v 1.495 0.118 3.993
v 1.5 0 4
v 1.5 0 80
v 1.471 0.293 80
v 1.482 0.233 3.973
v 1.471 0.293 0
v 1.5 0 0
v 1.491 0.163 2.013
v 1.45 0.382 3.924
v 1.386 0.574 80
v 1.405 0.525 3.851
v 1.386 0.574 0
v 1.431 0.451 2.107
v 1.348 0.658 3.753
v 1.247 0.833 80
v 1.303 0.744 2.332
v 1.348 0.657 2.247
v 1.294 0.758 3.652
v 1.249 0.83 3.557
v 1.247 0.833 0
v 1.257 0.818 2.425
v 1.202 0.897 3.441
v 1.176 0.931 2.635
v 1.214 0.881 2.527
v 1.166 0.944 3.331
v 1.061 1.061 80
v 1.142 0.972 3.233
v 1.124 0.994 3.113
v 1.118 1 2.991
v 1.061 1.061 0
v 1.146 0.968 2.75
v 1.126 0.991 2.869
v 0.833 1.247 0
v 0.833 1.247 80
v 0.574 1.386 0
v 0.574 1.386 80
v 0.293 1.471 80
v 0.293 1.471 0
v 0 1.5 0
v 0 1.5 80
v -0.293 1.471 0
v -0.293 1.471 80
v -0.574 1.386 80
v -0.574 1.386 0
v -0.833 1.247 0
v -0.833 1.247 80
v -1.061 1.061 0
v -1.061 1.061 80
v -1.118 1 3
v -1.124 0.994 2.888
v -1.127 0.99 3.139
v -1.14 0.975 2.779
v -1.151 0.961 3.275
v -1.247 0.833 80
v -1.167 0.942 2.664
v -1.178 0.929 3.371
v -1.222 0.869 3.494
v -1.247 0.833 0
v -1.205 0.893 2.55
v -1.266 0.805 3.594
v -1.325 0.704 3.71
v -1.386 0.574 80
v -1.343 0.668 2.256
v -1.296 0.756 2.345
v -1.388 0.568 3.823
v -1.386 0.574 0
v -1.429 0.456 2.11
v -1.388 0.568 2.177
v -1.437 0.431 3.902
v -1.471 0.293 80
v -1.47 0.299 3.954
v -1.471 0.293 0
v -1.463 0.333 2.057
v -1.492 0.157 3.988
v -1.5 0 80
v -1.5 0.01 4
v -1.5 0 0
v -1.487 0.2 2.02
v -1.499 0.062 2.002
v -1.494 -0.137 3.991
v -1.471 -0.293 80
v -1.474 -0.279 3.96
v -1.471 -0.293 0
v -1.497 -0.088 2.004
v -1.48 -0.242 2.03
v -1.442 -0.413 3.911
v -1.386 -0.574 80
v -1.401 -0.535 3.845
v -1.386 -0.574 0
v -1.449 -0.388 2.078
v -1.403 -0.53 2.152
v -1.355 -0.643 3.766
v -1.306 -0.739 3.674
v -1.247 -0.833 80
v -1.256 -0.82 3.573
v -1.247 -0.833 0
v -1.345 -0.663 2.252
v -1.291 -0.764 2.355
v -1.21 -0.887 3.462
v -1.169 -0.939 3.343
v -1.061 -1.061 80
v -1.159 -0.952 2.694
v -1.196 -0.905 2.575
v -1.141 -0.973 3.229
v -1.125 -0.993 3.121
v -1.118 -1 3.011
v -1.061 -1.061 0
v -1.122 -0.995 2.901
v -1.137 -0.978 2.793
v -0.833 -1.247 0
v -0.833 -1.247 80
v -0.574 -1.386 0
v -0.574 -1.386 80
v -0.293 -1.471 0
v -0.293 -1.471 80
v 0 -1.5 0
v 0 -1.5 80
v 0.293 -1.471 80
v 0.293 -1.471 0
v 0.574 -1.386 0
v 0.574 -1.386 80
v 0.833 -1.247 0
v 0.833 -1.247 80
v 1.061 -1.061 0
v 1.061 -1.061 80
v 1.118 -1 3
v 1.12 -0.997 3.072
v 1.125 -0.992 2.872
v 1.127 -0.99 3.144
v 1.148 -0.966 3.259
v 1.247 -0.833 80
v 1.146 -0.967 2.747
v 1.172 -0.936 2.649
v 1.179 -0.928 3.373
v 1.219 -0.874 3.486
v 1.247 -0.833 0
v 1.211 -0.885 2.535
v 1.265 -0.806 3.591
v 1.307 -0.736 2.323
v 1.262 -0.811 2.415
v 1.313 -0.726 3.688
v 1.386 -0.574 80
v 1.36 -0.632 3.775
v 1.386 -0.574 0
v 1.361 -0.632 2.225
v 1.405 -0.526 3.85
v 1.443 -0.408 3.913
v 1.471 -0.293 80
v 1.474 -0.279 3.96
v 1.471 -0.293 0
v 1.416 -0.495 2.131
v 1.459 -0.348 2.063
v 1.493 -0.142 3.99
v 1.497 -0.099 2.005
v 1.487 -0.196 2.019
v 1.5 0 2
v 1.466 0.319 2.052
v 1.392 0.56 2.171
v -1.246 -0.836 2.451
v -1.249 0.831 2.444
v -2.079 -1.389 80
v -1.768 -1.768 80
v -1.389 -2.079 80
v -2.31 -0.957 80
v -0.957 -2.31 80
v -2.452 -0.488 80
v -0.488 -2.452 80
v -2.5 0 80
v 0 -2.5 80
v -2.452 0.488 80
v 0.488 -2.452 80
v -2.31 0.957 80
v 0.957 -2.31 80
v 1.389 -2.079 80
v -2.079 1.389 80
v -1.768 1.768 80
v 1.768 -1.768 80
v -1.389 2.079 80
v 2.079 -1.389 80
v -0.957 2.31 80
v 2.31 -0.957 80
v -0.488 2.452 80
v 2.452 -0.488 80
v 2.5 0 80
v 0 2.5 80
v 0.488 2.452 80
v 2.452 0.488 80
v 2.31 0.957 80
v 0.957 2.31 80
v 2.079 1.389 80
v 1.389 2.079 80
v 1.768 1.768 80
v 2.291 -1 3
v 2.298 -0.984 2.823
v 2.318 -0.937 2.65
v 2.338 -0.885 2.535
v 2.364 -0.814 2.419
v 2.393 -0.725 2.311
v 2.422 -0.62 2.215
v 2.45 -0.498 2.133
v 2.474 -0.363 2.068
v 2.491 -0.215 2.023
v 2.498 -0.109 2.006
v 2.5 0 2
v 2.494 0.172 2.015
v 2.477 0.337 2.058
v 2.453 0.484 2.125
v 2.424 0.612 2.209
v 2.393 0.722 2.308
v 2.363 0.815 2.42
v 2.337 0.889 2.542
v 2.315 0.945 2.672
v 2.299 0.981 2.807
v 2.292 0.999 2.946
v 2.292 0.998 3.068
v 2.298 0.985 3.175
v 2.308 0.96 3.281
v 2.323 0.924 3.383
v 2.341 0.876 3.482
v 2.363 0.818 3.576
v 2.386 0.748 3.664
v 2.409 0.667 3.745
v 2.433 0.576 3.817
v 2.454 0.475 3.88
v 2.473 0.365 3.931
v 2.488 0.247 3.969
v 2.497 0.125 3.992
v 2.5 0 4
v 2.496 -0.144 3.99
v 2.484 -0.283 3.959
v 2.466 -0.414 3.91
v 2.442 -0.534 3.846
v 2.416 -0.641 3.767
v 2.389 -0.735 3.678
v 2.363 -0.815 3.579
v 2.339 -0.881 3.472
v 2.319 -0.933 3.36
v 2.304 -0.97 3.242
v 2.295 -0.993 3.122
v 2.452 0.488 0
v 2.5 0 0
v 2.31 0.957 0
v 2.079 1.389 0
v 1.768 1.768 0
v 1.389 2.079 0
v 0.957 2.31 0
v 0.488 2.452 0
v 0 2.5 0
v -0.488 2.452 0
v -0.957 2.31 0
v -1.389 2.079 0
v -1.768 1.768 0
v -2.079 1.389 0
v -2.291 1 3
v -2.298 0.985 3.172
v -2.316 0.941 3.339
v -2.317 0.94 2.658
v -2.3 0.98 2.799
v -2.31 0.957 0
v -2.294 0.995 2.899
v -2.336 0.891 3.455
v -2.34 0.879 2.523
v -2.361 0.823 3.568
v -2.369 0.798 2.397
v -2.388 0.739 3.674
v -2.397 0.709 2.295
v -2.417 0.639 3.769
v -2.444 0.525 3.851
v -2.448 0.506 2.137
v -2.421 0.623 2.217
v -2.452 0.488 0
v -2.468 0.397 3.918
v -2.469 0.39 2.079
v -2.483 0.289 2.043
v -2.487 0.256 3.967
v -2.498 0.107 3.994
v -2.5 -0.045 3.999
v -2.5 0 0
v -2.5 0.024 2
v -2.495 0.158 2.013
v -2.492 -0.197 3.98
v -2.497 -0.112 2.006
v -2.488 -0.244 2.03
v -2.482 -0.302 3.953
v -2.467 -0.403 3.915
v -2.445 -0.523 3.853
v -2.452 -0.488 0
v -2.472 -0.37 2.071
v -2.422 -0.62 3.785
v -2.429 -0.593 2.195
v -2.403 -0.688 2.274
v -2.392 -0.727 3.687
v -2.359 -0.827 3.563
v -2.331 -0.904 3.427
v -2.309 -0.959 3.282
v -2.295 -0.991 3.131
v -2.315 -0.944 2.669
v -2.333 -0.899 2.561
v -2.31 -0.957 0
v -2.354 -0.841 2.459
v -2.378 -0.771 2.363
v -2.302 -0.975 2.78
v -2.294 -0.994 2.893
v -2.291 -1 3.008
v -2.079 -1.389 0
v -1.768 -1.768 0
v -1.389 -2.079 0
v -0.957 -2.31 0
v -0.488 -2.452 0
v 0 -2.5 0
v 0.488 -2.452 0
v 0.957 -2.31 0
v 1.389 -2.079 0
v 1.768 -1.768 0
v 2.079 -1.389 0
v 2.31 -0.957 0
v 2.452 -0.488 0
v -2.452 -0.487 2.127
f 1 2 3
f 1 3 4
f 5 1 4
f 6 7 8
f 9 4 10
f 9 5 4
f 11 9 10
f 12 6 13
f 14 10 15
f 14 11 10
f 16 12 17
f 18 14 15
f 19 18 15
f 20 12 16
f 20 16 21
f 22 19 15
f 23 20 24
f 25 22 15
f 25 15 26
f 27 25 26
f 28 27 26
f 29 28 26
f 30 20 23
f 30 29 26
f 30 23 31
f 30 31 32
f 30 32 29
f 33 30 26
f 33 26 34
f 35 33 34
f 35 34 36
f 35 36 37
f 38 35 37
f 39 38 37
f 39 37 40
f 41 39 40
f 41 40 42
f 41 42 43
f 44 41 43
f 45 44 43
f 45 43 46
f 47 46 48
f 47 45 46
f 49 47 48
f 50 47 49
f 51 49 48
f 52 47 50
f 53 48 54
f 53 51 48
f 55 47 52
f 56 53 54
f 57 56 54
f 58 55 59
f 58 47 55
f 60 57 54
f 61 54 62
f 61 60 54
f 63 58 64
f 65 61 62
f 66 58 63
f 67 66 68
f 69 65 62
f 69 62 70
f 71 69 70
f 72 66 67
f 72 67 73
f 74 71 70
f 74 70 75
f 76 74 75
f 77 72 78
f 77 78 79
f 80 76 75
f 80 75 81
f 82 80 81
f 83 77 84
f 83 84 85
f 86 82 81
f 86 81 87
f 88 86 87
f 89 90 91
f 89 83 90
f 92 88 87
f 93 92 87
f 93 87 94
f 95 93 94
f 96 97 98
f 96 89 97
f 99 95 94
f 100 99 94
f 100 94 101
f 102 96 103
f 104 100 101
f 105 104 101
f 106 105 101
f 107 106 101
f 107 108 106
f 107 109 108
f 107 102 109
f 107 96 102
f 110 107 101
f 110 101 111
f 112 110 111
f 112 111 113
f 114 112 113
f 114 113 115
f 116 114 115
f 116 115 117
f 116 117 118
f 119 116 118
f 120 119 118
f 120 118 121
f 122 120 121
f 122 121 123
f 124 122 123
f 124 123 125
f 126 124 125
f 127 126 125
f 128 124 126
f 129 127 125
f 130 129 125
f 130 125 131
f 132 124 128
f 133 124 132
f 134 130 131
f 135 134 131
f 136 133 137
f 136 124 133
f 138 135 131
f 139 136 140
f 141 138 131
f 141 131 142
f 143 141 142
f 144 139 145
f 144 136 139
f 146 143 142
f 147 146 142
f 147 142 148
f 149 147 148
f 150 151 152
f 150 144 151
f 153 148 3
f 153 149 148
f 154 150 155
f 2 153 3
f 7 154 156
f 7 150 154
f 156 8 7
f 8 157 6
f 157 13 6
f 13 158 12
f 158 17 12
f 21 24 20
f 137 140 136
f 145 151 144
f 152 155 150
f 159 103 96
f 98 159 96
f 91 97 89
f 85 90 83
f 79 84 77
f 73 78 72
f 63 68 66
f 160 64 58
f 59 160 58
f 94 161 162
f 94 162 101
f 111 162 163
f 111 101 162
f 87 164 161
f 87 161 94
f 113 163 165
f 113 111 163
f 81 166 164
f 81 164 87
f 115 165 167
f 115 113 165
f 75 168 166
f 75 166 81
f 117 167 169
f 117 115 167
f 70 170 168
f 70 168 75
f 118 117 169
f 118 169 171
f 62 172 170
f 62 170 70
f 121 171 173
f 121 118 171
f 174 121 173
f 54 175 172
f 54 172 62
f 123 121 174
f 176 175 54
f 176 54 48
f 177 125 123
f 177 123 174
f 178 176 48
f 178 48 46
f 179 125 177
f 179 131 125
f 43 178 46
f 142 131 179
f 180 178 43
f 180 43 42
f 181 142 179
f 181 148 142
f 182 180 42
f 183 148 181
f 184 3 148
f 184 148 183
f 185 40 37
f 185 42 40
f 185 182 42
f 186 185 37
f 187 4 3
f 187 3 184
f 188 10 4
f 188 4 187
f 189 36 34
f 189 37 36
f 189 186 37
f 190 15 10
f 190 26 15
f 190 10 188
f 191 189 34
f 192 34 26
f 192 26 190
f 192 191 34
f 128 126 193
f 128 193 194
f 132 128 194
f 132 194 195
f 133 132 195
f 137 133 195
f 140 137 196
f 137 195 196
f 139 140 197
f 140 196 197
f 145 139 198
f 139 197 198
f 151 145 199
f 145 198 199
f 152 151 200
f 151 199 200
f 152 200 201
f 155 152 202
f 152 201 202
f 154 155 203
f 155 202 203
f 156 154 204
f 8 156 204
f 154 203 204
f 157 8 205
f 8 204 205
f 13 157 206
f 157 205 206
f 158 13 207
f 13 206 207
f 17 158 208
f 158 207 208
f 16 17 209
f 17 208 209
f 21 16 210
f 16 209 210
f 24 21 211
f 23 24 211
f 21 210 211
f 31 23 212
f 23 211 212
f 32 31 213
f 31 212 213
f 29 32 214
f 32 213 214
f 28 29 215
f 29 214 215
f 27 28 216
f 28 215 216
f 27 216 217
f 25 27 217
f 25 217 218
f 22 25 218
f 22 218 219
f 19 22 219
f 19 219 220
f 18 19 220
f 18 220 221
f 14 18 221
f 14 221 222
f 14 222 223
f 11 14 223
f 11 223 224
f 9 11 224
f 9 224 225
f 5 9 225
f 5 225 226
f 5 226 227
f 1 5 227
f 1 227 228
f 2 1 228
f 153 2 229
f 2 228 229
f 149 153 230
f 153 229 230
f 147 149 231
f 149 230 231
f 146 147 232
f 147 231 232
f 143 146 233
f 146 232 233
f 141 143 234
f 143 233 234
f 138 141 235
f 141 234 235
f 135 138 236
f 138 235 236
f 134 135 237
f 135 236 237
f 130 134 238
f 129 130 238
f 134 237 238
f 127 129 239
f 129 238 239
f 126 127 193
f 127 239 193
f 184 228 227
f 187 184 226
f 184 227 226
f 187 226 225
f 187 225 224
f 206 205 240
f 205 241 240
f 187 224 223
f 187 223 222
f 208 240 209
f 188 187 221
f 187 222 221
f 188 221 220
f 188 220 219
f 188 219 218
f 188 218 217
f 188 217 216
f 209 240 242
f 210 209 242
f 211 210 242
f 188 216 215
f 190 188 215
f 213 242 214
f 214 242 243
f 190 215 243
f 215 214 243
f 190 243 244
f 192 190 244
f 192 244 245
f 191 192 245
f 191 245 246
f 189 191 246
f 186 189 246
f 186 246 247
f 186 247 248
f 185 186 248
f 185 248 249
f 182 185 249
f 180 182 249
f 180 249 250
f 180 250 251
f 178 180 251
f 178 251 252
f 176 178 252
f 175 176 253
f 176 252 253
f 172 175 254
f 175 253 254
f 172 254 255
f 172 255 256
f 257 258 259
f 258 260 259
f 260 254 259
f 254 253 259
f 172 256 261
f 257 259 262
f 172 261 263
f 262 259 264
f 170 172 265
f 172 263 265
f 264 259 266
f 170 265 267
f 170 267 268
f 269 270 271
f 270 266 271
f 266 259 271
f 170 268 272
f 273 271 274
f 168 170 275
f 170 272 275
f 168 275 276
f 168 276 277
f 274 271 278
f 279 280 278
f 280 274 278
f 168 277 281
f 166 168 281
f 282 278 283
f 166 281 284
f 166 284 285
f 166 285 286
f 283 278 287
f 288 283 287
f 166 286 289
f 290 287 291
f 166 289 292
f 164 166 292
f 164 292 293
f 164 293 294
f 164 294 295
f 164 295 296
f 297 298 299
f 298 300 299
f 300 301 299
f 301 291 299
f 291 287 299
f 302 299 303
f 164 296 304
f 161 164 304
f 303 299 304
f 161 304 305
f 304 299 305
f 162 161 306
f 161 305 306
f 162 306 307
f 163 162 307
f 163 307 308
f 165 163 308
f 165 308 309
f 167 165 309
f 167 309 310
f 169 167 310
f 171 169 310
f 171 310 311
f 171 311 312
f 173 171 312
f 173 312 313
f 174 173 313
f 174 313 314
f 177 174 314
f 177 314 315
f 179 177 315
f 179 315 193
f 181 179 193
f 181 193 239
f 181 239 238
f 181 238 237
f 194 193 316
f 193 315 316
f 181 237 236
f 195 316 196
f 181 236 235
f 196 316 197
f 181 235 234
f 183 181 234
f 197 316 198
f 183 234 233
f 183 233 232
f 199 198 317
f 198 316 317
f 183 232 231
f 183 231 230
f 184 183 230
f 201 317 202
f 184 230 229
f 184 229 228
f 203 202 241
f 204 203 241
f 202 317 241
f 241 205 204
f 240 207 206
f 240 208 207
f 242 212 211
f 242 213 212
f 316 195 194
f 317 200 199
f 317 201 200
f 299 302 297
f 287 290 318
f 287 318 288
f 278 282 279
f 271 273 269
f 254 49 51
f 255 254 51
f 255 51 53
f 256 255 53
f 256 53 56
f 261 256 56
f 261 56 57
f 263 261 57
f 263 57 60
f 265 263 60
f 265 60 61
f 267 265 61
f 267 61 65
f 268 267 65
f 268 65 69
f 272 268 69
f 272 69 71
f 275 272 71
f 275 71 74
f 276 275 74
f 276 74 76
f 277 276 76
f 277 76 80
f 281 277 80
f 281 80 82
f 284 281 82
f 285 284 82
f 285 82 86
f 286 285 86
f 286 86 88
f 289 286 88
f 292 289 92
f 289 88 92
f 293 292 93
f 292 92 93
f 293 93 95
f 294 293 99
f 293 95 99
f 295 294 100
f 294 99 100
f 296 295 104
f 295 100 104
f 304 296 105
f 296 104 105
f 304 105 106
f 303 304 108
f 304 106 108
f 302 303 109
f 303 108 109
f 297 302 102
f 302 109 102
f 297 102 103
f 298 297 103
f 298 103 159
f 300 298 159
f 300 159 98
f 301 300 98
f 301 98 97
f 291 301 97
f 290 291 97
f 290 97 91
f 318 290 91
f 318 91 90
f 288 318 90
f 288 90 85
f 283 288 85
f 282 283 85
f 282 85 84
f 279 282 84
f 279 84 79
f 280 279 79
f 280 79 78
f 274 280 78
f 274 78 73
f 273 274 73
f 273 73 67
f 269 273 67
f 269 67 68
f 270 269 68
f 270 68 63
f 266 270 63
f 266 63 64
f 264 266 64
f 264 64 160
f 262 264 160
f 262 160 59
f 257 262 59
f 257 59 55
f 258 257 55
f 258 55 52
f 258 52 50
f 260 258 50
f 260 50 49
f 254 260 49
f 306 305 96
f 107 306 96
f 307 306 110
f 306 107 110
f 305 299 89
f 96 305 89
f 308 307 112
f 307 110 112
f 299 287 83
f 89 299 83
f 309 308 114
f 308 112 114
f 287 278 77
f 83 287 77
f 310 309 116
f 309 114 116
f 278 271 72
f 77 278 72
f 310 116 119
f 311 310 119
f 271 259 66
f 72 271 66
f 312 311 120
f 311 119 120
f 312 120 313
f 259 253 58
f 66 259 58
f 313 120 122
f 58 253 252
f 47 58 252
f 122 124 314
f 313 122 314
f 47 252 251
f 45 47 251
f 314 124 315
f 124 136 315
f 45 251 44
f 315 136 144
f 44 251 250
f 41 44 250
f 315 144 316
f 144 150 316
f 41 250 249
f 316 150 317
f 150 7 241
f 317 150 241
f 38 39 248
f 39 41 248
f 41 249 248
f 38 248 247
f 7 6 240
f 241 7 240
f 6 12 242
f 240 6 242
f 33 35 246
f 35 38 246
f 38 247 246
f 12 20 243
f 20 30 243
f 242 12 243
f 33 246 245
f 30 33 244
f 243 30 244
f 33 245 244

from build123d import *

# Parameters (mm, degrees)
F0_R     = 2.5
F0_R_2   = 1.5
F1_DEPTH = 80
F3_D     = 2
F3_DEPTH = 2.501
F4_D     = 2


with BuildPart() as f1:
    # F0 (on Top) → F1 (new body)
    with BuildSketch(Plane.XY):
        Circle(F0_R)
        Circle(F0_R_2, mode=Mode.SUBTRACT)
    extrude(amount=F1_DEPTH)

    # F3 (through all, one way)
    with BuildSketch(Plane.YZ):
        with Locations((0, 3)):
            Circle(F3_D / 2)
    extrude(amount=-F3_DEPTH, mode=Mode.SUBTRACT)

    # F4 (through all)
    with Locations(Plane(origin=(0, 0, 0), x_dir=(0, 1, 0), z_dir=(-1, 0, 0))):
        with Locations((0, -3)):
            Hole(F4_D / 2)


solid = f1.part
